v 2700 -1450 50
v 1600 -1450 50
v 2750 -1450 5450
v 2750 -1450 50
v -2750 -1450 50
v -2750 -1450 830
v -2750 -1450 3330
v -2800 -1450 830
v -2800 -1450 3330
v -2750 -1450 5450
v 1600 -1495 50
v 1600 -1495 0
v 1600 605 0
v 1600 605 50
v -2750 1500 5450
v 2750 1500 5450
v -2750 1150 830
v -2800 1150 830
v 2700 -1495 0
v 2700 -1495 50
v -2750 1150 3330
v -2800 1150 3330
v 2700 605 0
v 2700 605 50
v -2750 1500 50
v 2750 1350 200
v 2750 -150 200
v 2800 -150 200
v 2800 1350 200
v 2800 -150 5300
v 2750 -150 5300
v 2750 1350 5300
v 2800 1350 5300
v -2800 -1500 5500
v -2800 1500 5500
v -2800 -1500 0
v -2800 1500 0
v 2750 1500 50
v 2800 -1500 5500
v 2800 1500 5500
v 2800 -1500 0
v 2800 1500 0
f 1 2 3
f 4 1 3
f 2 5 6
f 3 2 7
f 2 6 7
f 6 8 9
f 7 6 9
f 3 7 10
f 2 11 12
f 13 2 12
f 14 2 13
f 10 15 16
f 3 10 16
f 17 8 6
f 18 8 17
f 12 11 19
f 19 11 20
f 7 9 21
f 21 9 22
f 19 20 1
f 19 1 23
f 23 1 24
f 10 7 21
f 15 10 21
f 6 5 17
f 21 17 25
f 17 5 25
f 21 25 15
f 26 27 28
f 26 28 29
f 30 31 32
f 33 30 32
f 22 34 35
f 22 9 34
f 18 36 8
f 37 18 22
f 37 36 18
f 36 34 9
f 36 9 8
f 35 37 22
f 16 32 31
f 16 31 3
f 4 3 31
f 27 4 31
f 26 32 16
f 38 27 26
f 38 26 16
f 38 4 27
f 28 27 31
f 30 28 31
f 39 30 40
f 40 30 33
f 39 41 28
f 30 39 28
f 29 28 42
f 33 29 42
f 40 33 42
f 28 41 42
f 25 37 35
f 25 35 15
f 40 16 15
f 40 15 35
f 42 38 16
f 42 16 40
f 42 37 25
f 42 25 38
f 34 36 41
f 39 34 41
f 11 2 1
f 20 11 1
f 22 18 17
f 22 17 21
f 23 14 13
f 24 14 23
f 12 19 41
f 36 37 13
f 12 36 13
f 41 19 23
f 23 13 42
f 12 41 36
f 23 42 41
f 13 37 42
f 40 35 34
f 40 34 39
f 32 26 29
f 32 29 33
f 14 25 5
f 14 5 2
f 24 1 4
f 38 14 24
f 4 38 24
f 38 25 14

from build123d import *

# Parameters (mm, degrees)
SKETCH3_W           = 5600
SKETCH3_H           = 3000
BOSS_EXTRUDE2_DEPTH = 5500
SHELL2_T            = -50
SKETCH4_W           = 2500
SKETCH4_H           = 2600
CUT_EXTRUDE4_DEPTH  = 3500
SKETCH5_W           = 1100
SKETCH5_H           = 2100
CUT_EXTRUDE6_DEPTH  = 6309.129675268
SKETCH6_W           = 5100
SKETCH6_H           = 1500
CUT_EXTRUDE7_DEPTH  = 7957.286822381


with BuildPart() as part:
    # Sketch3 → Boss-Extrude2 (new body)
    with BuildSketch(Plane.XY):
        Rectangle(SKETCH3_W, SKETCH3_H)
    extrude(amount=BOSS_EXTRUDE2_DEPTH)

    # Shell2
    shell2_openings = [part.faces().sort_by_distance(p)[0] for p in [
        (0, 1500, 2750),
    ]]
    offset(amount=SHELL2_T, openings=shell2_openings, kind=Kind.INTERSECTION)

    # Sketch4 → Cut-Extrude4 (cut)
    with BuildSketch(Plane.ZY.offset(2800)):
        with Locations((2080, -150)):
            Rectangle(SKETCH4_W, SKETCH4_H)
    extrude(amount=-CUT_EXTRUDE4_DEPTH, mode=Mode.SUBTRACT)

    # Sketch5 → Cut-Extrude6 (cut, through all)
    with BuildSketch(Plane.XY.offset(50)):
        with Locations((2150, -445)):
            Rectangle(SKETCH5_W, SKETCH5_H)
    extrude(amount=-CUT_EXTRUDE6_DEPTH, mode=Mode.SUBTRACT)

    # Sketch6 → Cut-Extrude7 (cut, through all)
    with BuildSketch(Plane.ZY.offset(-2750)):
        with Locations((2750, 600)):
            Rectangle(SKETCH6_W, SKETCH6_H)
    extrude(amount=-CUT_EXTRUDE7_DEPTH, mode=Mode.SUBTRACT)


solid = part.part
